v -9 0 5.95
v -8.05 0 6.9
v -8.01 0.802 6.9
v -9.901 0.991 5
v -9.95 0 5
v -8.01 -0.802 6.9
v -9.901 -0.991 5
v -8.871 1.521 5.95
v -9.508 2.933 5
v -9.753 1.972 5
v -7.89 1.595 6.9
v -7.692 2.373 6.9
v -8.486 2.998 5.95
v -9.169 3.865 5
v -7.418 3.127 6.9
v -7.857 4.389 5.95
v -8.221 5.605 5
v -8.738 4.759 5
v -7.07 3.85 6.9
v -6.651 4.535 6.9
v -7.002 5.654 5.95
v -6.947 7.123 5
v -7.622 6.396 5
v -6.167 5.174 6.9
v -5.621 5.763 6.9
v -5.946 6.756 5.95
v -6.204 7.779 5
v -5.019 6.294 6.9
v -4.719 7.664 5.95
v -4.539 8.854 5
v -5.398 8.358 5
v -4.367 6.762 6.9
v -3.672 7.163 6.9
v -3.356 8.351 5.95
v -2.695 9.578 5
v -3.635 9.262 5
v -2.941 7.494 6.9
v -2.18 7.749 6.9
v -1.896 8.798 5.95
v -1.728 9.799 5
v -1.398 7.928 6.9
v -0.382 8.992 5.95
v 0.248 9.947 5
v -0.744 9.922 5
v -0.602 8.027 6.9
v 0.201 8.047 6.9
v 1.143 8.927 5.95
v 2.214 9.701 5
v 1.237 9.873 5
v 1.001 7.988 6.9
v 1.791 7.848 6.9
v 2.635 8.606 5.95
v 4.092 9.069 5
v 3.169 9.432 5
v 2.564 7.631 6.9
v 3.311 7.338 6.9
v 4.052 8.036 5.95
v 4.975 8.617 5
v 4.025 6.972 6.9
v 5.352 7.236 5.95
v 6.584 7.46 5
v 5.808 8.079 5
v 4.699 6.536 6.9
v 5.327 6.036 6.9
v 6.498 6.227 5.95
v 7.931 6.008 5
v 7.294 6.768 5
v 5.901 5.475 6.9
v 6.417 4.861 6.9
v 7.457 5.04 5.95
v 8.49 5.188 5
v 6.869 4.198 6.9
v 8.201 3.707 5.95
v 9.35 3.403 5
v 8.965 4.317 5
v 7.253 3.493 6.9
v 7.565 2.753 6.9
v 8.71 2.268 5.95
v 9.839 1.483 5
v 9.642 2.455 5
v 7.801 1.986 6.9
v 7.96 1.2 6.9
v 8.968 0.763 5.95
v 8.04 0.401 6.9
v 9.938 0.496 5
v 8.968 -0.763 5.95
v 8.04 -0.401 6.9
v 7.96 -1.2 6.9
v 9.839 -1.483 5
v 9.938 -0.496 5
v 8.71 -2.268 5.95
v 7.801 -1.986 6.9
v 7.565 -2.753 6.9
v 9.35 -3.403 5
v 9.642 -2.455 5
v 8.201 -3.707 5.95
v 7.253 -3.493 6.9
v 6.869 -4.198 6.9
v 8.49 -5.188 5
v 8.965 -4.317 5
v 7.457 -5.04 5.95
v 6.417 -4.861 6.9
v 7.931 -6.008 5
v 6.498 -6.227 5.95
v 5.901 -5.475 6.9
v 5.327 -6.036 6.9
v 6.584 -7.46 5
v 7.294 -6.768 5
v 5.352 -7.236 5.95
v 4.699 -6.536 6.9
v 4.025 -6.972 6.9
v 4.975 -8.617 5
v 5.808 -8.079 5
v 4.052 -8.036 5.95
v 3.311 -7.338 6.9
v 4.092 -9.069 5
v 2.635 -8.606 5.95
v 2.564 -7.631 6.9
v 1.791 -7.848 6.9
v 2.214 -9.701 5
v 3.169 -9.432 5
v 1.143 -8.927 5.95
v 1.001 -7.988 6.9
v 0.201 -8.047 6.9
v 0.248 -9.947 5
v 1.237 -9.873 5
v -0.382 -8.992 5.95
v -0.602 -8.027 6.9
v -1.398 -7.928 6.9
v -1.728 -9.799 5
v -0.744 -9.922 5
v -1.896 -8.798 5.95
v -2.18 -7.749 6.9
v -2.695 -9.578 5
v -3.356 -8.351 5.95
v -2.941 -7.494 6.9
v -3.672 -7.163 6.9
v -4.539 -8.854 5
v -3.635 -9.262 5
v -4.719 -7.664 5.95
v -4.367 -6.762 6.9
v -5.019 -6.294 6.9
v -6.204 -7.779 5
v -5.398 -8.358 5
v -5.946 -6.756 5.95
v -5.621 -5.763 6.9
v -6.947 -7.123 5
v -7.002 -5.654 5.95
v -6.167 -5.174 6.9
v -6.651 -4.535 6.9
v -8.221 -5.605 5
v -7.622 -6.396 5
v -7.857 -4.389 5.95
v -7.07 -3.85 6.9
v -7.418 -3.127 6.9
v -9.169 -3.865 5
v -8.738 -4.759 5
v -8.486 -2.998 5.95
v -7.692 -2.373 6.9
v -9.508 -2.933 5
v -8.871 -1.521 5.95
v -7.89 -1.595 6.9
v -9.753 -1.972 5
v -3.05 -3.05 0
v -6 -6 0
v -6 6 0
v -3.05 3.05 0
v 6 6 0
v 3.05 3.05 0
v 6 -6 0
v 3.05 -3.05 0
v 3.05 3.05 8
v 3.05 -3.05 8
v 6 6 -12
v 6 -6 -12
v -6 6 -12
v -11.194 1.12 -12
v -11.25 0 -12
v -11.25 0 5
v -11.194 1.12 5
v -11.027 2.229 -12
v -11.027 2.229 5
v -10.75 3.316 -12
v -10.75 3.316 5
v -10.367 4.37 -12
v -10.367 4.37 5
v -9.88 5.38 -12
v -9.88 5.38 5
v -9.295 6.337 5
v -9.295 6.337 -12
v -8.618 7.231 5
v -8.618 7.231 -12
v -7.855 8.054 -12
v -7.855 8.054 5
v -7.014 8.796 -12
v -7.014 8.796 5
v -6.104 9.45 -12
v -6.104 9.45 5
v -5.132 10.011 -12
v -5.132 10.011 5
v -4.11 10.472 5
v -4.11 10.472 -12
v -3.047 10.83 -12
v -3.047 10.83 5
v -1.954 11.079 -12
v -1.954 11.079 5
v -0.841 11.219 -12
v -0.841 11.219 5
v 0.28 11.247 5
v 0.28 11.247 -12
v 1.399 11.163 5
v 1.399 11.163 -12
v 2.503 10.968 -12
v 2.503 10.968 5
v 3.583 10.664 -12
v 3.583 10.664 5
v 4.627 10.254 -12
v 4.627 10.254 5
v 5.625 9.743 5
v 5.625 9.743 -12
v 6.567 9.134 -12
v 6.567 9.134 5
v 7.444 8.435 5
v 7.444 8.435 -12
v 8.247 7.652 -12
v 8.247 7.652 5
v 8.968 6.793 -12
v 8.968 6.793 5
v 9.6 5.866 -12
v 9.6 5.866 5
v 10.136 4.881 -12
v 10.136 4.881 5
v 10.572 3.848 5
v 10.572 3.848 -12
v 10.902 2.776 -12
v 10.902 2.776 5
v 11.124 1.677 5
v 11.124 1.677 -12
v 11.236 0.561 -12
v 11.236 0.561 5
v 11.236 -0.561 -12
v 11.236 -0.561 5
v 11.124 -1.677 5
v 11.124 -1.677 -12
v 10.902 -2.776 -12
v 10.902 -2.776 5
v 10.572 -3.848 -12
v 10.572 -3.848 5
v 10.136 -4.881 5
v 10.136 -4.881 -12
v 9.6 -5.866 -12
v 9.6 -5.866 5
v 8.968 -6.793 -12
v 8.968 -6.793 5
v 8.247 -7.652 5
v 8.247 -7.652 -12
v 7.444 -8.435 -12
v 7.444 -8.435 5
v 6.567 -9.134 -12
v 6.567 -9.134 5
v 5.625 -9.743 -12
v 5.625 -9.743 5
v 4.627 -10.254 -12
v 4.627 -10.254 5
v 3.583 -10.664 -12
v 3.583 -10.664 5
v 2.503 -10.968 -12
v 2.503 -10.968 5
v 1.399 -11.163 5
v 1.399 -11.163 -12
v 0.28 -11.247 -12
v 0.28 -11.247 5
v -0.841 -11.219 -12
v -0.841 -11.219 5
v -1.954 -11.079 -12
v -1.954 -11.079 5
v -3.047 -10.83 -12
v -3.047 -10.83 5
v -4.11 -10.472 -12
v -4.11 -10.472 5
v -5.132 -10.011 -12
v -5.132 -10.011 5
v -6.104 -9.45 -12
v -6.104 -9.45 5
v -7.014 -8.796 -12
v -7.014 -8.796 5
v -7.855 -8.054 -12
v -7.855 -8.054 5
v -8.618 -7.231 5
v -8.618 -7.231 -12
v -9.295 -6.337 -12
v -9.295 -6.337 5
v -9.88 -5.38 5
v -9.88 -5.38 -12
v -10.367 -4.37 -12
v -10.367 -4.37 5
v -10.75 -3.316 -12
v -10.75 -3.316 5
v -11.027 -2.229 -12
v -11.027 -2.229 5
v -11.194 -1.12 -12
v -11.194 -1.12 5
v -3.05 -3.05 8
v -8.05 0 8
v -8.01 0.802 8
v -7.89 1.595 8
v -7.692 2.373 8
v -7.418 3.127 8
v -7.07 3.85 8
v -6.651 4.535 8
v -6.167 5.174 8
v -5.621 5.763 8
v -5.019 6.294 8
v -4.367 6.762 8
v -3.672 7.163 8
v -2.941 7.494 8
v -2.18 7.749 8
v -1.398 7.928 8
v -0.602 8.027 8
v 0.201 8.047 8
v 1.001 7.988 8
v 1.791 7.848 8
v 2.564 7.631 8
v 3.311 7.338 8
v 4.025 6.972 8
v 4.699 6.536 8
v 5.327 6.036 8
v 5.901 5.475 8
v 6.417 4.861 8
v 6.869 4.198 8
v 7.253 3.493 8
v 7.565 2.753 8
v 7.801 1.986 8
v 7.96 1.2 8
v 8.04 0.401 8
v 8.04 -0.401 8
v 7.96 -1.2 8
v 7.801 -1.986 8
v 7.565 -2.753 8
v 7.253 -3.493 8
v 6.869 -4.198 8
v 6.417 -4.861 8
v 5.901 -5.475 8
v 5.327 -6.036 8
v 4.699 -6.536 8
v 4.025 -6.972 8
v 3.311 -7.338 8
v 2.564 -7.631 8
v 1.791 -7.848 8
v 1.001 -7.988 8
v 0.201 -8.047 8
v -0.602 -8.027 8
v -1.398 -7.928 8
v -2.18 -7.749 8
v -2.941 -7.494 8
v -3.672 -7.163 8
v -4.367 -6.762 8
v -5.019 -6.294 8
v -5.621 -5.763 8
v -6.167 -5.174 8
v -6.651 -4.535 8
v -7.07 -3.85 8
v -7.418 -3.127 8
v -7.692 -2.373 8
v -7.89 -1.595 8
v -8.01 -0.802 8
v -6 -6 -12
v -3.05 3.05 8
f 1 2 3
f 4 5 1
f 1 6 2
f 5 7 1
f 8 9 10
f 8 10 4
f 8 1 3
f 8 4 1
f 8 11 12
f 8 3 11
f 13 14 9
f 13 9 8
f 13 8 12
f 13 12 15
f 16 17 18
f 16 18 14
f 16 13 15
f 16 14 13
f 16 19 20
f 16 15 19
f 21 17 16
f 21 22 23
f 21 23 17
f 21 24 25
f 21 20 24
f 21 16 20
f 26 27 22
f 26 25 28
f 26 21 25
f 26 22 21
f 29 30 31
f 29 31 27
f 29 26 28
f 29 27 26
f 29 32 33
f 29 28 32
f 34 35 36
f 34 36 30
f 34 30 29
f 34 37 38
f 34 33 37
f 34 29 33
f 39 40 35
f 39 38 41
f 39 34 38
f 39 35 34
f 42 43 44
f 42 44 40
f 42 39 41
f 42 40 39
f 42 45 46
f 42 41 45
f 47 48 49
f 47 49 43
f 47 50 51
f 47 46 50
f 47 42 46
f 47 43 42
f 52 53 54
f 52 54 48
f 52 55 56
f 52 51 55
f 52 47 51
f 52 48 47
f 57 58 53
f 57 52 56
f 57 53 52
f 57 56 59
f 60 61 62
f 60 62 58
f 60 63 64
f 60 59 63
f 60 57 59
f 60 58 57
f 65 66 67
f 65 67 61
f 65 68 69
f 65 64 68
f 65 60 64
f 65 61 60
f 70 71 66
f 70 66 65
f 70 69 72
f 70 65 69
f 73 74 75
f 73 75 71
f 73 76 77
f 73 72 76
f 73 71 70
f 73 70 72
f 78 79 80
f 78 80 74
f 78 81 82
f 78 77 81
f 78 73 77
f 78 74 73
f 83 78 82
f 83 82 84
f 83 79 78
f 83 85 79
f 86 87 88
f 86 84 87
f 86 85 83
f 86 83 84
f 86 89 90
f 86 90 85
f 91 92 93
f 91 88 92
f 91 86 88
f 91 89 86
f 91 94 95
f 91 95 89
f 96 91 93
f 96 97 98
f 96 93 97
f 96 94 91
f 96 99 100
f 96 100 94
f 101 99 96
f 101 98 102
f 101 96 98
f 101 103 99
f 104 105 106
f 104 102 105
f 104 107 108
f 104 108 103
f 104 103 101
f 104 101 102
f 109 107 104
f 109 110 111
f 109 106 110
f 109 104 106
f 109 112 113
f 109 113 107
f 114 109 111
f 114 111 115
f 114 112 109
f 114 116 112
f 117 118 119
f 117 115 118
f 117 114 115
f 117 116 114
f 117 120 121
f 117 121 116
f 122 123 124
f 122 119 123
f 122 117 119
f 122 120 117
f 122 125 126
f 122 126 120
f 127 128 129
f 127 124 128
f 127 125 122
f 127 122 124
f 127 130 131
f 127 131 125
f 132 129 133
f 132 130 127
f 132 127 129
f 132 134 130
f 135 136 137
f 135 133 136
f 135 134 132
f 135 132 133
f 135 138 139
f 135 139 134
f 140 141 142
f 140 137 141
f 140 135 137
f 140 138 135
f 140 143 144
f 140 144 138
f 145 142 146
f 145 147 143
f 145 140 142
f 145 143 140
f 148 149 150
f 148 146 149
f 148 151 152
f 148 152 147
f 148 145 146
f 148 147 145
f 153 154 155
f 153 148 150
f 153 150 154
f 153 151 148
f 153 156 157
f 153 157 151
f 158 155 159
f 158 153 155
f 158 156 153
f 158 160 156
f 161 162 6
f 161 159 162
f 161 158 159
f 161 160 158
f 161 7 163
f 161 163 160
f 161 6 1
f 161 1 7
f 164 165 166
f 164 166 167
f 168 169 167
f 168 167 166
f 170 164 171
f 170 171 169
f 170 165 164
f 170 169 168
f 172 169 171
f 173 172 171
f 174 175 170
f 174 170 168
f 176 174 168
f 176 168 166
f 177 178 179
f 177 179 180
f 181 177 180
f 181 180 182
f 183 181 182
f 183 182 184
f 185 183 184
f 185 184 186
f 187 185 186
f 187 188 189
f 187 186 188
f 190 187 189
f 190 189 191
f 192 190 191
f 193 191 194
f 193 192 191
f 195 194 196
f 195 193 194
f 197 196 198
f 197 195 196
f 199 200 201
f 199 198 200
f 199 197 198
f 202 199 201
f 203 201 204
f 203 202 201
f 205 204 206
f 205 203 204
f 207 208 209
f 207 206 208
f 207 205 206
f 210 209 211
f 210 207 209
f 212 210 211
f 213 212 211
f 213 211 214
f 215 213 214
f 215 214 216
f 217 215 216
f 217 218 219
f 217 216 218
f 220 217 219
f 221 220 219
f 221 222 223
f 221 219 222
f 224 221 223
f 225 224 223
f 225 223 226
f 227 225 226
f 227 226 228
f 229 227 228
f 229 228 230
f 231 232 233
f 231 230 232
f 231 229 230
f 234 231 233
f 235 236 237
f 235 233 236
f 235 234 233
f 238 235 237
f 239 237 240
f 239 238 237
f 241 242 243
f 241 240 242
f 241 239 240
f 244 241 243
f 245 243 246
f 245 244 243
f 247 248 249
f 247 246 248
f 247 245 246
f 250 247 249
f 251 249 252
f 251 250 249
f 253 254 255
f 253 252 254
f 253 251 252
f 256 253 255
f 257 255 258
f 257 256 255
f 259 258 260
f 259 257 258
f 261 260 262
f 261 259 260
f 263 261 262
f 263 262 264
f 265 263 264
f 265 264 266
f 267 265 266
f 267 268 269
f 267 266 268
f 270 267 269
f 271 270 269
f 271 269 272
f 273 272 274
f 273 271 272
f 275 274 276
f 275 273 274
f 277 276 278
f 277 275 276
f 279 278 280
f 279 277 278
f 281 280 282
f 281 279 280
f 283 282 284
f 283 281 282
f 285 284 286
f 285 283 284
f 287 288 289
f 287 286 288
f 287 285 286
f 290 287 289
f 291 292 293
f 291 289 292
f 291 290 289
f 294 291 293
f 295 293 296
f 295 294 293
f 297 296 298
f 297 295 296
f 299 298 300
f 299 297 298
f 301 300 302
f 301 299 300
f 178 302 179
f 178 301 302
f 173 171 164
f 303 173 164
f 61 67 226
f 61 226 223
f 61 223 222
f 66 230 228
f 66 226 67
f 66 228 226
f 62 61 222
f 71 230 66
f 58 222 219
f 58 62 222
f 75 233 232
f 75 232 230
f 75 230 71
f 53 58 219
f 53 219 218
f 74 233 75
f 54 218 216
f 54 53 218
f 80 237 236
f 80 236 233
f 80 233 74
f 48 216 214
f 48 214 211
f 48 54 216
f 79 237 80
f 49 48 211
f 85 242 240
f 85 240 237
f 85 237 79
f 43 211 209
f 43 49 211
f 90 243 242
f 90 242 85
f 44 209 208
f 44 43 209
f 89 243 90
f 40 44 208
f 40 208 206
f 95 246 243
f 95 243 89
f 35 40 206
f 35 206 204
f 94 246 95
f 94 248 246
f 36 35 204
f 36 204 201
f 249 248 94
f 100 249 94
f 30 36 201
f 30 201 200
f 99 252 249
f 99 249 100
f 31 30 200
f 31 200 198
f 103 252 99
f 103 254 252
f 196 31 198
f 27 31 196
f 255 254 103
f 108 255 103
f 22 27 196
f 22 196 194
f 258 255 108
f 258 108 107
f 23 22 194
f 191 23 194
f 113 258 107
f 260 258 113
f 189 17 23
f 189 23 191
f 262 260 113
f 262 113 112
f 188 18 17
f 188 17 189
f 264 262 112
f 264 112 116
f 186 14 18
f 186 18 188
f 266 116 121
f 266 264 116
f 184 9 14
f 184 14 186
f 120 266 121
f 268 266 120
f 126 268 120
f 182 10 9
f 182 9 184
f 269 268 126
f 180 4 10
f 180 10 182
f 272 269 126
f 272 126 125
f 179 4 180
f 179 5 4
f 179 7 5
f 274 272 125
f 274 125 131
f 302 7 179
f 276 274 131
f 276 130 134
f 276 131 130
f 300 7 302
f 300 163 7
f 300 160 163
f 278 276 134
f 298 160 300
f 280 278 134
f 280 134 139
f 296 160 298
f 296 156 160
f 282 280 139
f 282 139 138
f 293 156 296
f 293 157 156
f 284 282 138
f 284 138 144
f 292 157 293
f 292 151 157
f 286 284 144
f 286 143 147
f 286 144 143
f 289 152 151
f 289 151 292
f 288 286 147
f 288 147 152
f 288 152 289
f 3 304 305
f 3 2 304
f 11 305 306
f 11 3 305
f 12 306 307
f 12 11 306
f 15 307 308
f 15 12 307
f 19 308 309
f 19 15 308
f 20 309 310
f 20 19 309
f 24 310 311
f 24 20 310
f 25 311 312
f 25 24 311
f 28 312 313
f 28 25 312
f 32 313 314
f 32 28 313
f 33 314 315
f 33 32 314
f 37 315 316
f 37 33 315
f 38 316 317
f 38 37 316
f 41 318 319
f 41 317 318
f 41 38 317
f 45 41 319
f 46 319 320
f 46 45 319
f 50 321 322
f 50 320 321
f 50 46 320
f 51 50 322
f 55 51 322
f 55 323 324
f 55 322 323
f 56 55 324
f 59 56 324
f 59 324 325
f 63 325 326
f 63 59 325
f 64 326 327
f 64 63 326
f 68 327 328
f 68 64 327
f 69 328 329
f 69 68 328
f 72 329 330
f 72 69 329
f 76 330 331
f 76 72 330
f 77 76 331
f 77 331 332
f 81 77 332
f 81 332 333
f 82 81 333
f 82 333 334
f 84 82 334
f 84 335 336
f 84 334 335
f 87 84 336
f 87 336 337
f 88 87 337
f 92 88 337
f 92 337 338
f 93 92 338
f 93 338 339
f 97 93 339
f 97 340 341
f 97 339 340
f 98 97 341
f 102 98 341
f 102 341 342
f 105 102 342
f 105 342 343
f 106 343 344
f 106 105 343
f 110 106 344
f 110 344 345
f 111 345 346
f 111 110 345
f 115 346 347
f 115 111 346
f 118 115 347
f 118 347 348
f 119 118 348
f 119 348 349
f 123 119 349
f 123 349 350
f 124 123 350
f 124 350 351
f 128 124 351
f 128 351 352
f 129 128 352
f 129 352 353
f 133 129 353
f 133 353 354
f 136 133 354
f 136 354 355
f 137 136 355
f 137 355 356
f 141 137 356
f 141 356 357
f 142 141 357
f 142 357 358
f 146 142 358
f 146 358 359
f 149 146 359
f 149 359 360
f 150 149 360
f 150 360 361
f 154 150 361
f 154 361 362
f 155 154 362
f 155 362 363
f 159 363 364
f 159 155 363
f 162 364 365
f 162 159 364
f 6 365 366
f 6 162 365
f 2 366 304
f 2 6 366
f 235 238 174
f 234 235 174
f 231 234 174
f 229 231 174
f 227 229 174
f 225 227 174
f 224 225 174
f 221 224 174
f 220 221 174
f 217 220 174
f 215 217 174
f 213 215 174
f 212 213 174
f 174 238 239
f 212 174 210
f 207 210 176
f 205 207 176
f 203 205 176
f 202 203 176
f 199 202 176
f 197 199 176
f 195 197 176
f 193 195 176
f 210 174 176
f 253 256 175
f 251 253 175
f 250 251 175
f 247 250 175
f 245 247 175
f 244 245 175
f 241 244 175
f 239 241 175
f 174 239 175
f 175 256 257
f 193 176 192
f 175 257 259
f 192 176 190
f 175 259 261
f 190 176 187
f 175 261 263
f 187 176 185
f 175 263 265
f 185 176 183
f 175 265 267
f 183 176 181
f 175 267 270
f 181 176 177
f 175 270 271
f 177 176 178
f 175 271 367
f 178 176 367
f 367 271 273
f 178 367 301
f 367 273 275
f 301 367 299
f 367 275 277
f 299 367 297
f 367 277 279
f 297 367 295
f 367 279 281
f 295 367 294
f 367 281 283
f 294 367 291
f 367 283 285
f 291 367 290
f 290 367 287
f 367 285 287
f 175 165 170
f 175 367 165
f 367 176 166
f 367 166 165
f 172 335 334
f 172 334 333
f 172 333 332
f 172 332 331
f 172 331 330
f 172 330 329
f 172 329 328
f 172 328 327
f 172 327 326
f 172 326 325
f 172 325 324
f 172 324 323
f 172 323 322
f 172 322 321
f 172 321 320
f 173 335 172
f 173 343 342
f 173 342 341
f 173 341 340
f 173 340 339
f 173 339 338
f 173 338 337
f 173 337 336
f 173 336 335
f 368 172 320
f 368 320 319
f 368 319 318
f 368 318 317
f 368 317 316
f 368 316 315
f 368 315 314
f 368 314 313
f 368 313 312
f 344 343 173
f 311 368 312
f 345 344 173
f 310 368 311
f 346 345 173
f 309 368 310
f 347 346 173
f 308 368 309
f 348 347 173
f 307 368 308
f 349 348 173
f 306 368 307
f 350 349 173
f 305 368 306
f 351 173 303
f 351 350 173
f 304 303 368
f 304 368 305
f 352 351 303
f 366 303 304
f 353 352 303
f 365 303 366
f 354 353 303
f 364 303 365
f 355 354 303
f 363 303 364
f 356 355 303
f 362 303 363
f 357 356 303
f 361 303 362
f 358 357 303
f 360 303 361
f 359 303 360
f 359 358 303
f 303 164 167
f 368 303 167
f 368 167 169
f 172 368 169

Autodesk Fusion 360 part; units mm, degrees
sketch "Sketch1" plane through (0, 0, 0) normal (0, 1, 0) x (1, 0, 0)
  line L0 (0, 64.0421) -> (0, -79.964)
  line L1 (-3.05, -8) -> (-3.05, 0)
  line L2 (-6.25, 0) -> (-6.25, 12)
  line L3 (-6.25, 0) -> (-3.05, 0)
  line L4 (-8.05, -8) -> (-8.05, -5)
  line L5 (-11.25, -5) -> (-8.05, -5)
  line L6 (-11.25, -5) -> (-11.25, 12)
  line L7 (-8.05, -8) -> (-3.05, -8)
  line L8 (-11.25, 12) -> (-6.25, 12)
  line L9 (-3.05, -8) -> (0, -7.961)
  line L10 (-6.25, 12) -> (0, 12)
  dimension "d1" = 12.5
  dimension "d2" = 6.1
  dimension "d3" = 8
  dimension "d7" = 12
  dimension "d8" = -5
revolve "Revolve1" add sketch "Sketch1" angle 360 about axis through (0, 0, -64.0421) along (0, 0, 1)
sketch "Sketch2" plane through (0, 0, 8) normal (0, 0, 1) x (-1, 0, 0)
  circle A0 centre (0, 0) radius 3.05 construction
  circle A1 centre (0, 0) radius 8.05
  line L0 (-3.05, 3.05) -> (3.05, 3.05)
  line L1 (3.05, 3.05) -> (3.05, -3.05)
  line L2 (3.05, -3.05) -> (-3.05, -3.05)
  line L3 (-3.05, -3.05) -> (-3.05, 3.05)
  line L4 (-3.05, 3.05) -> (3.05, -3.05) construction
  line L5 (3.05, 3.05) -> (-3.05, -3.05) construction
  point P0 (3.05, 0)
extrude "Extrude1" cut sketch "Sketch2" against normal through all contours L0 L1 L2 L3
sketch "Sketch3" plane through (0, 0, -12) normal (0, 0, -1) x (1, 0, 0)
  line L0 (3.05, 3.05) -> (3.05, -3.05)
  line L1 (3.05, -3.05) -> (-3.05, -3.05)
  line L2 (-3.05, -3.05) -> (-3.05, 3.05)
  line L3 (-3.05, 3.05) -> (3.05, 3.05)
  circle A0 centre (0, 0) radius 11.25
  line L4 (-6, 6) -> (6, 6)
  line L5 (6, 6) -> (6, -6)
  line L6 (6, -6) -> (-6, -6)
  line L7 (-6, -6) -> (-6, 6)
  line L8 (-6, 6) -> (6, -6) construction
  line L9 (6, 6) -> (-6, -6) construction
  dimension "d11" = 12
  dimension "d12" = 12
extrude "Extrude2" cut sketch "Sketch3" against normal blind 12 contours L4 L5 L6 L7
chamfer "Chamfer1" distance 1.9 angle 45 1 edges at (-7.5052, 2.911, 5)
